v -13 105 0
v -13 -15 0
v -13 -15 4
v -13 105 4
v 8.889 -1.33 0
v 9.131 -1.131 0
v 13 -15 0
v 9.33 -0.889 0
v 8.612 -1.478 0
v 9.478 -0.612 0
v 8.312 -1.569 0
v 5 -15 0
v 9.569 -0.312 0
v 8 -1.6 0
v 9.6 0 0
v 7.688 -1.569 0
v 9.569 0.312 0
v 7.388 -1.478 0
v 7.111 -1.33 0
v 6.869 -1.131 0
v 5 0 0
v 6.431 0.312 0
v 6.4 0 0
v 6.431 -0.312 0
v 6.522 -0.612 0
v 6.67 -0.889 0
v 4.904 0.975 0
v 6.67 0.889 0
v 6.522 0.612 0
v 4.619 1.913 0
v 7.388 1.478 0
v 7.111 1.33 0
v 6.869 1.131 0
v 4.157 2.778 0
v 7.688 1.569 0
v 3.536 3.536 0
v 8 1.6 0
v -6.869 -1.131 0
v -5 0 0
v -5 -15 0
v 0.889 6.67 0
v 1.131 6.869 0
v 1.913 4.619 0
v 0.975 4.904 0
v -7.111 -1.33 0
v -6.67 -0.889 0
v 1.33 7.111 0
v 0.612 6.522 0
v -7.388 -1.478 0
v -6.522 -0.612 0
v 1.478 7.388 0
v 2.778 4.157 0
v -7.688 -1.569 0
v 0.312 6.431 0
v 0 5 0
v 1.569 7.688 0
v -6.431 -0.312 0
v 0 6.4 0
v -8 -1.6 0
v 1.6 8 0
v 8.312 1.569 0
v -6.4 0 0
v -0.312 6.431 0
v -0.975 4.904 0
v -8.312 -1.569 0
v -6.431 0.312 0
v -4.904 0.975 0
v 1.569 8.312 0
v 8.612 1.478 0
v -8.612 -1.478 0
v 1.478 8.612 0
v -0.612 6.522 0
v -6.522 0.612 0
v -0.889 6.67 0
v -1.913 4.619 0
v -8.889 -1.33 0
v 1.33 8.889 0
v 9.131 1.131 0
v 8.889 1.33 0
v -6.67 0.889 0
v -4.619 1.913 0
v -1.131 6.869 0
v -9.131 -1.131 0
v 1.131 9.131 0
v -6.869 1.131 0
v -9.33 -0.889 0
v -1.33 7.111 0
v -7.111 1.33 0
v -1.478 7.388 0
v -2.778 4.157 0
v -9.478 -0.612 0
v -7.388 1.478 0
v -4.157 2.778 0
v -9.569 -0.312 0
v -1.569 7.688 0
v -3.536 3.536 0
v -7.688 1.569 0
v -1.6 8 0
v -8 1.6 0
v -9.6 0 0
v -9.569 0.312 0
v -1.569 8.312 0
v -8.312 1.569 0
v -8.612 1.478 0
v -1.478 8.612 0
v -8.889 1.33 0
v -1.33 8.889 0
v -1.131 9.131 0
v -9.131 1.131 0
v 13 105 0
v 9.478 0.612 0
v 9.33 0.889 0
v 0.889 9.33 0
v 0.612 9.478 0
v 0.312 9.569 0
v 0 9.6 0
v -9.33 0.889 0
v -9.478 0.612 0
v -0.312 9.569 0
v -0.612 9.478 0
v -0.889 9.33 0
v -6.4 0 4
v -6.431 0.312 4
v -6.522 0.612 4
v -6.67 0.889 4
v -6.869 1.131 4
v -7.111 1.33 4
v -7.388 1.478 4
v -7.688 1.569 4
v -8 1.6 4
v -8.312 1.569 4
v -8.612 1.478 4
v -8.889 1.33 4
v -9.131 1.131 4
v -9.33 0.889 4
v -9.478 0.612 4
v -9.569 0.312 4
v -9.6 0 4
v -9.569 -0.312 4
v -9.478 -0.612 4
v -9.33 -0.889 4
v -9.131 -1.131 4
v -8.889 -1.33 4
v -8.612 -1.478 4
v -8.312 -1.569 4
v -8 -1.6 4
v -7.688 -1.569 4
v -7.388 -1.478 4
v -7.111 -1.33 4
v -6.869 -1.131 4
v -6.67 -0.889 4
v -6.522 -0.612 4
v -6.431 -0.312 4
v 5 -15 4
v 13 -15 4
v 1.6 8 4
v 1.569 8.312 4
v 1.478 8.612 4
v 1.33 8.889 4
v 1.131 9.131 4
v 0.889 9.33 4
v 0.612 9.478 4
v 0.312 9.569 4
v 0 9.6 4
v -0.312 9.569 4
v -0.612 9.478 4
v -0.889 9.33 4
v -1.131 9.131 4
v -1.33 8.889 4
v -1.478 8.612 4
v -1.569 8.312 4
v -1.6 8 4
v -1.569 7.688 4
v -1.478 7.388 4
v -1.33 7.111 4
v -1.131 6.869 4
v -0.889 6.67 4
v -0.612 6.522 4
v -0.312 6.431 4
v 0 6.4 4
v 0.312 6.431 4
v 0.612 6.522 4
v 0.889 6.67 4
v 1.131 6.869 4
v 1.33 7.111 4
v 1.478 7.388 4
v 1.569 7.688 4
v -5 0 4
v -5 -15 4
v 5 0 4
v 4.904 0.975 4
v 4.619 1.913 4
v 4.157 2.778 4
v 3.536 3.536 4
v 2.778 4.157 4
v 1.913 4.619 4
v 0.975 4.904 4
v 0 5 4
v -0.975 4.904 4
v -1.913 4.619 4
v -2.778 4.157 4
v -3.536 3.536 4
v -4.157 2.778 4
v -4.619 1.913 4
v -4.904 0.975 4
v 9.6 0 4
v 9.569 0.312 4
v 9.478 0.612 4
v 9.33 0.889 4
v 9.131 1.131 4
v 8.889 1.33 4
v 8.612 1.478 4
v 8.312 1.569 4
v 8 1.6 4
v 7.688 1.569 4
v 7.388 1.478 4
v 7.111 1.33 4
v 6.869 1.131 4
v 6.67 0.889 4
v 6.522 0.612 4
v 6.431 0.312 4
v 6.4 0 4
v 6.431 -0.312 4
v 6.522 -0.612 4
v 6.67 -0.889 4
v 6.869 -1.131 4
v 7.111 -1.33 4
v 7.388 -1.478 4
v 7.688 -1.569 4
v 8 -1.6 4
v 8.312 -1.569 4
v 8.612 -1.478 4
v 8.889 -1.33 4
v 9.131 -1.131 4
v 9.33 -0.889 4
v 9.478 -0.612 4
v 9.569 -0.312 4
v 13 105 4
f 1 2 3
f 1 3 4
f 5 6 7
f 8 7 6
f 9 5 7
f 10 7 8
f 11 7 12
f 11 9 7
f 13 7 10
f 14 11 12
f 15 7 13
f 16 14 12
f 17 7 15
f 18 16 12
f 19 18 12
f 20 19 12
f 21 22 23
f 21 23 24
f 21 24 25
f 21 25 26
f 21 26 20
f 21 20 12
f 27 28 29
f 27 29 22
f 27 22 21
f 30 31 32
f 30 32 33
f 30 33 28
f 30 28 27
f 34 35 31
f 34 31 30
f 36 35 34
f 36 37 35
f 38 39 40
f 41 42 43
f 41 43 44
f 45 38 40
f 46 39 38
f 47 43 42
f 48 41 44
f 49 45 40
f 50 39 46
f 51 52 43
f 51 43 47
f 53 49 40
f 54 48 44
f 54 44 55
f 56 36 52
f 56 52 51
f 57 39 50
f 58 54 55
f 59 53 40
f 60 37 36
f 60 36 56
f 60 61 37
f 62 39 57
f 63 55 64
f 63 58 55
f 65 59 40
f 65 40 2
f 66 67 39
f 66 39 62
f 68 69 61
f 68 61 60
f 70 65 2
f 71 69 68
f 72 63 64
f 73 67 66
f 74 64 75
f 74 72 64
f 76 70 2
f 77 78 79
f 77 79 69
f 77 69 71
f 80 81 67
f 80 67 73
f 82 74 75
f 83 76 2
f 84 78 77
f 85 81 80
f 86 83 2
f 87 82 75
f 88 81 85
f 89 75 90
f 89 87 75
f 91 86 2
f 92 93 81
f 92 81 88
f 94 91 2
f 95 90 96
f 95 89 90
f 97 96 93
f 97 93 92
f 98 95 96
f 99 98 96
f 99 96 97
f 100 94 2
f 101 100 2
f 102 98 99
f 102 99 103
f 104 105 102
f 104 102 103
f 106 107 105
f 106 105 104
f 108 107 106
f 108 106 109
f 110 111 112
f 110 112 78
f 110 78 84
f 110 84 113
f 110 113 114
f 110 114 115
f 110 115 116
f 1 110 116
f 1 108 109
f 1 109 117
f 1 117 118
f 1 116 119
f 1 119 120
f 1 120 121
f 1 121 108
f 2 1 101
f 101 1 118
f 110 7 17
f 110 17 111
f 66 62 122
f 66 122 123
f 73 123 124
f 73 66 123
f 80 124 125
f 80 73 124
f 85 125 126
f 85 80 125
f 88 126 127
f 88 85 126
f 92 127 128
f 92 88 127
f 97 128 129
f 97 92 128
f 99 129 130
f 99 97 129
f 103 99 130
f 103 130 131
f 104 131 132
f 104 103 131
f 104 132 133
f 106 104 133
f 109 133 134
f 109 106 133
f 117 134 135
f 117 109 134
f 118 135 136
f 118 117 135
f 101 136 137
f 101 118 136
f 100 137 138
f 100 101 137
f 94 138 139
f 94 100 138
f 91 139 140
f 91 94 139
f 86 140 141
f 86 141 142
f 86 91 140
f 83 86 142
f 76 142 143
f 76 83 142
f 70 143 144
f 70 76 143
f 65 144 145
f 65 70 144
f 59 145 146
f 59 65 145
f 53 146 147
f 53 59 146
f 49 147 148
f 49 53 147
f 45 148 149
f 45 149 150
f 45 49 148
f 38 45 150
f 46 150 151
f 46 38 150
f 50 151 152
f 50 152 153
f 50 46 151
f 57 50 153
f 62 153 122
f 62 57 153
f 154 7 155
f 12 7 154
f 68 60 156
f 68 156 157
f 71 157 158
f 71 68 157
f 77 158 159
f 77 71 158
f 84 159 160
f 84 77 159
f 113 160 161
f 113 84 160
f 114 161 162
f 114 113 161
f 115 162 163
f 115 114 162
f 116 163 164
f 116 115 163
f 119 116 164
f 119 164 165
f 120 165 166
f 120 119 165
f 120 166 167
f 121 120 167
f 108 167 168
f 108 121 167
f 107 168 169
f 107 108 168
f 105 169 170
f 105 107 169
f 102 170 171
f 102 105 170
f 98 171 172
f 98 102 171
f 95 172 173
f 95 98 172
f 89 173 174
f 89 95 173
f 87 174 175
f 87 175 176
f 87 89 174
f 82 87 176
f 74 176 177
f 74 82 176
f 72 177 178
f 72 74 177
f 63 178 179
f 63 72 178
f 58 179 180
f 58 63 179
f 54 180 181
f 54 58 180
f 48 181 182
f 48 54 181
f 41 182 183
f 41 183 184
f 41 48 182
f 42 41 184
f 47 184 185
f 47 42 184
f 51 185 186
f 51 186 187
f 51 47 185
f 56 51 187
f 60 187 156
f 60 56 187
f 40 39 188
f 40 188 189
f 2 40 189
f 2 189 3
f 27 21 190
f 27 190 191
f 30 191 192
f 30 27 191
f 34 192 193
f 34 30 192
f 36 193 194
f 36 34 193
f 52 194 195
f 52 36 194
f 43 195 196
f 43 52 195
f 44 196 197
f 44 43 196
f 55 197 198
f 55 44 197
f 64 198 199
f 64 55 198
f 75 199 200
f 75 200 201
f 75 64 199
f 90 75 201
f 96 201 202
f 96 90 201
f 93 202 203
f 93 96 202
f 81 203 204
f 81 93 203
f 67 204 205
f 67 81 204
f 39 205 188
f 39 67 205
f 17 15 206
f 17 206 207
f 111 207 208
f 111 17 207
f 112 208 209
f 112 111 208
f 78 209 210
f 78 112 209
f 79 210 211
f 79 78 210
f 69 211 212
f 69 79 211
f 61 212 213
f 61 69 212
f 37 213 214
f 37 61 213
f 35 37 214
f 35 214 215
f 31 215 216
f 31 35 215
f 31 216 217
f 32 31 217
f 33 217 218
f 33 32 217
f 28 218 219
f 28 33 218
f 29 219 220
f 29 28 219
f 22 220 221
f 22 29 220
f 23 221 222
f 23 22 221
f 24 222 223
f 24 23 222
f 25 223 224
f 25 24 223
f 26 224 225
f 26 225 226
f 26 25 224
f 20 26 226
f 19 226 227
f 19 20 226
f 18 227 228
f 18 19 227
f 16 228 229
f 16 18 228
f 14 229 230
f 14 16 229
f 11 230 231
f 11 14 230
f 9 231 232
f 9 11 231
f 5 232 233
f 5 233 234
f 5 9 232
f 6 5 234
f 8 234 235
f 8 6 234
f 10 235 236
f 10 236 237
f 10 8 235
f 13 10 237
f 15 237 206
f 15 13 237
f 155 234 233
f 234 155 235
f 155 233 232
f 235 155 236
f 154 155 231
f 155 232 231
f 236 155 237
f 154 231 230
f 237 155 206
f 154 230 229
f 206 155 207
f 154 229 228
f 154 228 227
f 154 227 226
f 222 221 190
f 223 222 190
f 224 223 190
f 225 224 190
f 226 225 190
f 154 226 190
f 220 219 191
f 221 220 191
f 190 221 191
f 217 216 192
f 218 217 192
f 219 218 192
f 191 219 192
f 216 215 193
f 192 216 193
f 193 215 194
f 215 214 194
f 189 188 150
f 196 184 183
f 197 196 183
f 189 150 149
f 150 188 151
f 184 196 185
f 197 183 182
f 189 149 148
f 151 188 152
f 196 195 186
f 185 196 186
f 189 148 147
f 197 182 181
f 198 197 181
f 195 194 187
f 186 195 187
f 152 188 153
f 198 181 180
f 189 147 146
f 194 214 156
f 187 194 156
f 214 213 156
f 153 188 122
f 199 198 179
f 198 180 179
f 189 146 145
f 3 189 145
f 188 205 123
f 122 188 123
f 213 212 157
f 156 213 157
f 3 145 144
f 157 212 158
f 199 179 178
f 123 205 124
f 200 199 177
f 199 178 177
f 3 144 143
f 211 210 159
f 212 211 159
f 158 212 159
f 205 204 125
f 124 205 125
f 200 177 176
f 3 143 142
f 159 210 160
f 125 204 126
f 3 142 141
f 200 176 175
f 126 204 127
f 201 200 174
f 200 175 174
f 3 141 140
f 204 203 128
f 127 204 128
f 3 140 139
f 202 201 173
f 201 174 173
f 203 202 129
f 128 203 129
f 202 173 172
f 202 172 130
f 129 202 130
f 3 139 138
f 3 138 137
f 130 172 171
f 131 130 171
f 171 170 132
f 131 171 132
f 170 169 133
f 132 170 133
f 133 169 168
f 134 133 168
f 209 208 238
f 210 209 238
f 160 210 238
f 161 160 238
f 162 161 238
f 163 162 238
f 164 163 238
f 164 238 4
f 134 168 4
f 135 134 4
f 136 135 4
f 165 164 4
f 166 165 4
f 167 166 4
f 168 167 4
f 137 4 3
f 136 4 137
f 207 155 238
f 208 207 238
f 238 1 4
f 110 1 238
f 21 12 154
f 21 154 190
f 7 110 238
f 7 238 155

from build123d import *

# Parameters (mm, degrees)
SKETCH_1_R      = 1.6
EXTRUDE_1_DEPTH = 4


with BuildPart() as part:
    # 草图1 → 凸台-拉伸1 (new body)
    with BuildSketch(Plane.XY):
        with BuildLine():
            Line((-8, -15), (-13, -15))
            Line((-13, -15), (-13, -12))
            Line((-13, -12), (-13, 105))
            Line((-13, 105), (-11, 105))
            Line((-11, 105), (11, 105))
            Line((11, 105), (13, 105))
            Line((13, 105), (13, -12))
            Line((13, -12), (13, -15))
            Line((13, -15), (8, -15))
            Line((8, -15), (5, -15))
            Line((5, -15), (5, 0))
            ThreePointArc((5, 0), (0, 5), (-5, 0))
            Line((-5, 0), (-5, -15))
            Line((-5, -15), (-8, -15))
        make_face()
        with Locations((8, 0)):
            Circle(SKETCH_1_R, mode=Mode.SUBTRACT)
        with Locations((-8, 0)):
            Circle(SKETCH_1_R, mode=Mode.SUBTRACT)
        with Locations((0, 8)):
            Circle(SKETCH_1_R, mode=Mode.SUBTRACT)
    extrude(amount=EXTRUDE_1_DEPTH)


solid = part.part
